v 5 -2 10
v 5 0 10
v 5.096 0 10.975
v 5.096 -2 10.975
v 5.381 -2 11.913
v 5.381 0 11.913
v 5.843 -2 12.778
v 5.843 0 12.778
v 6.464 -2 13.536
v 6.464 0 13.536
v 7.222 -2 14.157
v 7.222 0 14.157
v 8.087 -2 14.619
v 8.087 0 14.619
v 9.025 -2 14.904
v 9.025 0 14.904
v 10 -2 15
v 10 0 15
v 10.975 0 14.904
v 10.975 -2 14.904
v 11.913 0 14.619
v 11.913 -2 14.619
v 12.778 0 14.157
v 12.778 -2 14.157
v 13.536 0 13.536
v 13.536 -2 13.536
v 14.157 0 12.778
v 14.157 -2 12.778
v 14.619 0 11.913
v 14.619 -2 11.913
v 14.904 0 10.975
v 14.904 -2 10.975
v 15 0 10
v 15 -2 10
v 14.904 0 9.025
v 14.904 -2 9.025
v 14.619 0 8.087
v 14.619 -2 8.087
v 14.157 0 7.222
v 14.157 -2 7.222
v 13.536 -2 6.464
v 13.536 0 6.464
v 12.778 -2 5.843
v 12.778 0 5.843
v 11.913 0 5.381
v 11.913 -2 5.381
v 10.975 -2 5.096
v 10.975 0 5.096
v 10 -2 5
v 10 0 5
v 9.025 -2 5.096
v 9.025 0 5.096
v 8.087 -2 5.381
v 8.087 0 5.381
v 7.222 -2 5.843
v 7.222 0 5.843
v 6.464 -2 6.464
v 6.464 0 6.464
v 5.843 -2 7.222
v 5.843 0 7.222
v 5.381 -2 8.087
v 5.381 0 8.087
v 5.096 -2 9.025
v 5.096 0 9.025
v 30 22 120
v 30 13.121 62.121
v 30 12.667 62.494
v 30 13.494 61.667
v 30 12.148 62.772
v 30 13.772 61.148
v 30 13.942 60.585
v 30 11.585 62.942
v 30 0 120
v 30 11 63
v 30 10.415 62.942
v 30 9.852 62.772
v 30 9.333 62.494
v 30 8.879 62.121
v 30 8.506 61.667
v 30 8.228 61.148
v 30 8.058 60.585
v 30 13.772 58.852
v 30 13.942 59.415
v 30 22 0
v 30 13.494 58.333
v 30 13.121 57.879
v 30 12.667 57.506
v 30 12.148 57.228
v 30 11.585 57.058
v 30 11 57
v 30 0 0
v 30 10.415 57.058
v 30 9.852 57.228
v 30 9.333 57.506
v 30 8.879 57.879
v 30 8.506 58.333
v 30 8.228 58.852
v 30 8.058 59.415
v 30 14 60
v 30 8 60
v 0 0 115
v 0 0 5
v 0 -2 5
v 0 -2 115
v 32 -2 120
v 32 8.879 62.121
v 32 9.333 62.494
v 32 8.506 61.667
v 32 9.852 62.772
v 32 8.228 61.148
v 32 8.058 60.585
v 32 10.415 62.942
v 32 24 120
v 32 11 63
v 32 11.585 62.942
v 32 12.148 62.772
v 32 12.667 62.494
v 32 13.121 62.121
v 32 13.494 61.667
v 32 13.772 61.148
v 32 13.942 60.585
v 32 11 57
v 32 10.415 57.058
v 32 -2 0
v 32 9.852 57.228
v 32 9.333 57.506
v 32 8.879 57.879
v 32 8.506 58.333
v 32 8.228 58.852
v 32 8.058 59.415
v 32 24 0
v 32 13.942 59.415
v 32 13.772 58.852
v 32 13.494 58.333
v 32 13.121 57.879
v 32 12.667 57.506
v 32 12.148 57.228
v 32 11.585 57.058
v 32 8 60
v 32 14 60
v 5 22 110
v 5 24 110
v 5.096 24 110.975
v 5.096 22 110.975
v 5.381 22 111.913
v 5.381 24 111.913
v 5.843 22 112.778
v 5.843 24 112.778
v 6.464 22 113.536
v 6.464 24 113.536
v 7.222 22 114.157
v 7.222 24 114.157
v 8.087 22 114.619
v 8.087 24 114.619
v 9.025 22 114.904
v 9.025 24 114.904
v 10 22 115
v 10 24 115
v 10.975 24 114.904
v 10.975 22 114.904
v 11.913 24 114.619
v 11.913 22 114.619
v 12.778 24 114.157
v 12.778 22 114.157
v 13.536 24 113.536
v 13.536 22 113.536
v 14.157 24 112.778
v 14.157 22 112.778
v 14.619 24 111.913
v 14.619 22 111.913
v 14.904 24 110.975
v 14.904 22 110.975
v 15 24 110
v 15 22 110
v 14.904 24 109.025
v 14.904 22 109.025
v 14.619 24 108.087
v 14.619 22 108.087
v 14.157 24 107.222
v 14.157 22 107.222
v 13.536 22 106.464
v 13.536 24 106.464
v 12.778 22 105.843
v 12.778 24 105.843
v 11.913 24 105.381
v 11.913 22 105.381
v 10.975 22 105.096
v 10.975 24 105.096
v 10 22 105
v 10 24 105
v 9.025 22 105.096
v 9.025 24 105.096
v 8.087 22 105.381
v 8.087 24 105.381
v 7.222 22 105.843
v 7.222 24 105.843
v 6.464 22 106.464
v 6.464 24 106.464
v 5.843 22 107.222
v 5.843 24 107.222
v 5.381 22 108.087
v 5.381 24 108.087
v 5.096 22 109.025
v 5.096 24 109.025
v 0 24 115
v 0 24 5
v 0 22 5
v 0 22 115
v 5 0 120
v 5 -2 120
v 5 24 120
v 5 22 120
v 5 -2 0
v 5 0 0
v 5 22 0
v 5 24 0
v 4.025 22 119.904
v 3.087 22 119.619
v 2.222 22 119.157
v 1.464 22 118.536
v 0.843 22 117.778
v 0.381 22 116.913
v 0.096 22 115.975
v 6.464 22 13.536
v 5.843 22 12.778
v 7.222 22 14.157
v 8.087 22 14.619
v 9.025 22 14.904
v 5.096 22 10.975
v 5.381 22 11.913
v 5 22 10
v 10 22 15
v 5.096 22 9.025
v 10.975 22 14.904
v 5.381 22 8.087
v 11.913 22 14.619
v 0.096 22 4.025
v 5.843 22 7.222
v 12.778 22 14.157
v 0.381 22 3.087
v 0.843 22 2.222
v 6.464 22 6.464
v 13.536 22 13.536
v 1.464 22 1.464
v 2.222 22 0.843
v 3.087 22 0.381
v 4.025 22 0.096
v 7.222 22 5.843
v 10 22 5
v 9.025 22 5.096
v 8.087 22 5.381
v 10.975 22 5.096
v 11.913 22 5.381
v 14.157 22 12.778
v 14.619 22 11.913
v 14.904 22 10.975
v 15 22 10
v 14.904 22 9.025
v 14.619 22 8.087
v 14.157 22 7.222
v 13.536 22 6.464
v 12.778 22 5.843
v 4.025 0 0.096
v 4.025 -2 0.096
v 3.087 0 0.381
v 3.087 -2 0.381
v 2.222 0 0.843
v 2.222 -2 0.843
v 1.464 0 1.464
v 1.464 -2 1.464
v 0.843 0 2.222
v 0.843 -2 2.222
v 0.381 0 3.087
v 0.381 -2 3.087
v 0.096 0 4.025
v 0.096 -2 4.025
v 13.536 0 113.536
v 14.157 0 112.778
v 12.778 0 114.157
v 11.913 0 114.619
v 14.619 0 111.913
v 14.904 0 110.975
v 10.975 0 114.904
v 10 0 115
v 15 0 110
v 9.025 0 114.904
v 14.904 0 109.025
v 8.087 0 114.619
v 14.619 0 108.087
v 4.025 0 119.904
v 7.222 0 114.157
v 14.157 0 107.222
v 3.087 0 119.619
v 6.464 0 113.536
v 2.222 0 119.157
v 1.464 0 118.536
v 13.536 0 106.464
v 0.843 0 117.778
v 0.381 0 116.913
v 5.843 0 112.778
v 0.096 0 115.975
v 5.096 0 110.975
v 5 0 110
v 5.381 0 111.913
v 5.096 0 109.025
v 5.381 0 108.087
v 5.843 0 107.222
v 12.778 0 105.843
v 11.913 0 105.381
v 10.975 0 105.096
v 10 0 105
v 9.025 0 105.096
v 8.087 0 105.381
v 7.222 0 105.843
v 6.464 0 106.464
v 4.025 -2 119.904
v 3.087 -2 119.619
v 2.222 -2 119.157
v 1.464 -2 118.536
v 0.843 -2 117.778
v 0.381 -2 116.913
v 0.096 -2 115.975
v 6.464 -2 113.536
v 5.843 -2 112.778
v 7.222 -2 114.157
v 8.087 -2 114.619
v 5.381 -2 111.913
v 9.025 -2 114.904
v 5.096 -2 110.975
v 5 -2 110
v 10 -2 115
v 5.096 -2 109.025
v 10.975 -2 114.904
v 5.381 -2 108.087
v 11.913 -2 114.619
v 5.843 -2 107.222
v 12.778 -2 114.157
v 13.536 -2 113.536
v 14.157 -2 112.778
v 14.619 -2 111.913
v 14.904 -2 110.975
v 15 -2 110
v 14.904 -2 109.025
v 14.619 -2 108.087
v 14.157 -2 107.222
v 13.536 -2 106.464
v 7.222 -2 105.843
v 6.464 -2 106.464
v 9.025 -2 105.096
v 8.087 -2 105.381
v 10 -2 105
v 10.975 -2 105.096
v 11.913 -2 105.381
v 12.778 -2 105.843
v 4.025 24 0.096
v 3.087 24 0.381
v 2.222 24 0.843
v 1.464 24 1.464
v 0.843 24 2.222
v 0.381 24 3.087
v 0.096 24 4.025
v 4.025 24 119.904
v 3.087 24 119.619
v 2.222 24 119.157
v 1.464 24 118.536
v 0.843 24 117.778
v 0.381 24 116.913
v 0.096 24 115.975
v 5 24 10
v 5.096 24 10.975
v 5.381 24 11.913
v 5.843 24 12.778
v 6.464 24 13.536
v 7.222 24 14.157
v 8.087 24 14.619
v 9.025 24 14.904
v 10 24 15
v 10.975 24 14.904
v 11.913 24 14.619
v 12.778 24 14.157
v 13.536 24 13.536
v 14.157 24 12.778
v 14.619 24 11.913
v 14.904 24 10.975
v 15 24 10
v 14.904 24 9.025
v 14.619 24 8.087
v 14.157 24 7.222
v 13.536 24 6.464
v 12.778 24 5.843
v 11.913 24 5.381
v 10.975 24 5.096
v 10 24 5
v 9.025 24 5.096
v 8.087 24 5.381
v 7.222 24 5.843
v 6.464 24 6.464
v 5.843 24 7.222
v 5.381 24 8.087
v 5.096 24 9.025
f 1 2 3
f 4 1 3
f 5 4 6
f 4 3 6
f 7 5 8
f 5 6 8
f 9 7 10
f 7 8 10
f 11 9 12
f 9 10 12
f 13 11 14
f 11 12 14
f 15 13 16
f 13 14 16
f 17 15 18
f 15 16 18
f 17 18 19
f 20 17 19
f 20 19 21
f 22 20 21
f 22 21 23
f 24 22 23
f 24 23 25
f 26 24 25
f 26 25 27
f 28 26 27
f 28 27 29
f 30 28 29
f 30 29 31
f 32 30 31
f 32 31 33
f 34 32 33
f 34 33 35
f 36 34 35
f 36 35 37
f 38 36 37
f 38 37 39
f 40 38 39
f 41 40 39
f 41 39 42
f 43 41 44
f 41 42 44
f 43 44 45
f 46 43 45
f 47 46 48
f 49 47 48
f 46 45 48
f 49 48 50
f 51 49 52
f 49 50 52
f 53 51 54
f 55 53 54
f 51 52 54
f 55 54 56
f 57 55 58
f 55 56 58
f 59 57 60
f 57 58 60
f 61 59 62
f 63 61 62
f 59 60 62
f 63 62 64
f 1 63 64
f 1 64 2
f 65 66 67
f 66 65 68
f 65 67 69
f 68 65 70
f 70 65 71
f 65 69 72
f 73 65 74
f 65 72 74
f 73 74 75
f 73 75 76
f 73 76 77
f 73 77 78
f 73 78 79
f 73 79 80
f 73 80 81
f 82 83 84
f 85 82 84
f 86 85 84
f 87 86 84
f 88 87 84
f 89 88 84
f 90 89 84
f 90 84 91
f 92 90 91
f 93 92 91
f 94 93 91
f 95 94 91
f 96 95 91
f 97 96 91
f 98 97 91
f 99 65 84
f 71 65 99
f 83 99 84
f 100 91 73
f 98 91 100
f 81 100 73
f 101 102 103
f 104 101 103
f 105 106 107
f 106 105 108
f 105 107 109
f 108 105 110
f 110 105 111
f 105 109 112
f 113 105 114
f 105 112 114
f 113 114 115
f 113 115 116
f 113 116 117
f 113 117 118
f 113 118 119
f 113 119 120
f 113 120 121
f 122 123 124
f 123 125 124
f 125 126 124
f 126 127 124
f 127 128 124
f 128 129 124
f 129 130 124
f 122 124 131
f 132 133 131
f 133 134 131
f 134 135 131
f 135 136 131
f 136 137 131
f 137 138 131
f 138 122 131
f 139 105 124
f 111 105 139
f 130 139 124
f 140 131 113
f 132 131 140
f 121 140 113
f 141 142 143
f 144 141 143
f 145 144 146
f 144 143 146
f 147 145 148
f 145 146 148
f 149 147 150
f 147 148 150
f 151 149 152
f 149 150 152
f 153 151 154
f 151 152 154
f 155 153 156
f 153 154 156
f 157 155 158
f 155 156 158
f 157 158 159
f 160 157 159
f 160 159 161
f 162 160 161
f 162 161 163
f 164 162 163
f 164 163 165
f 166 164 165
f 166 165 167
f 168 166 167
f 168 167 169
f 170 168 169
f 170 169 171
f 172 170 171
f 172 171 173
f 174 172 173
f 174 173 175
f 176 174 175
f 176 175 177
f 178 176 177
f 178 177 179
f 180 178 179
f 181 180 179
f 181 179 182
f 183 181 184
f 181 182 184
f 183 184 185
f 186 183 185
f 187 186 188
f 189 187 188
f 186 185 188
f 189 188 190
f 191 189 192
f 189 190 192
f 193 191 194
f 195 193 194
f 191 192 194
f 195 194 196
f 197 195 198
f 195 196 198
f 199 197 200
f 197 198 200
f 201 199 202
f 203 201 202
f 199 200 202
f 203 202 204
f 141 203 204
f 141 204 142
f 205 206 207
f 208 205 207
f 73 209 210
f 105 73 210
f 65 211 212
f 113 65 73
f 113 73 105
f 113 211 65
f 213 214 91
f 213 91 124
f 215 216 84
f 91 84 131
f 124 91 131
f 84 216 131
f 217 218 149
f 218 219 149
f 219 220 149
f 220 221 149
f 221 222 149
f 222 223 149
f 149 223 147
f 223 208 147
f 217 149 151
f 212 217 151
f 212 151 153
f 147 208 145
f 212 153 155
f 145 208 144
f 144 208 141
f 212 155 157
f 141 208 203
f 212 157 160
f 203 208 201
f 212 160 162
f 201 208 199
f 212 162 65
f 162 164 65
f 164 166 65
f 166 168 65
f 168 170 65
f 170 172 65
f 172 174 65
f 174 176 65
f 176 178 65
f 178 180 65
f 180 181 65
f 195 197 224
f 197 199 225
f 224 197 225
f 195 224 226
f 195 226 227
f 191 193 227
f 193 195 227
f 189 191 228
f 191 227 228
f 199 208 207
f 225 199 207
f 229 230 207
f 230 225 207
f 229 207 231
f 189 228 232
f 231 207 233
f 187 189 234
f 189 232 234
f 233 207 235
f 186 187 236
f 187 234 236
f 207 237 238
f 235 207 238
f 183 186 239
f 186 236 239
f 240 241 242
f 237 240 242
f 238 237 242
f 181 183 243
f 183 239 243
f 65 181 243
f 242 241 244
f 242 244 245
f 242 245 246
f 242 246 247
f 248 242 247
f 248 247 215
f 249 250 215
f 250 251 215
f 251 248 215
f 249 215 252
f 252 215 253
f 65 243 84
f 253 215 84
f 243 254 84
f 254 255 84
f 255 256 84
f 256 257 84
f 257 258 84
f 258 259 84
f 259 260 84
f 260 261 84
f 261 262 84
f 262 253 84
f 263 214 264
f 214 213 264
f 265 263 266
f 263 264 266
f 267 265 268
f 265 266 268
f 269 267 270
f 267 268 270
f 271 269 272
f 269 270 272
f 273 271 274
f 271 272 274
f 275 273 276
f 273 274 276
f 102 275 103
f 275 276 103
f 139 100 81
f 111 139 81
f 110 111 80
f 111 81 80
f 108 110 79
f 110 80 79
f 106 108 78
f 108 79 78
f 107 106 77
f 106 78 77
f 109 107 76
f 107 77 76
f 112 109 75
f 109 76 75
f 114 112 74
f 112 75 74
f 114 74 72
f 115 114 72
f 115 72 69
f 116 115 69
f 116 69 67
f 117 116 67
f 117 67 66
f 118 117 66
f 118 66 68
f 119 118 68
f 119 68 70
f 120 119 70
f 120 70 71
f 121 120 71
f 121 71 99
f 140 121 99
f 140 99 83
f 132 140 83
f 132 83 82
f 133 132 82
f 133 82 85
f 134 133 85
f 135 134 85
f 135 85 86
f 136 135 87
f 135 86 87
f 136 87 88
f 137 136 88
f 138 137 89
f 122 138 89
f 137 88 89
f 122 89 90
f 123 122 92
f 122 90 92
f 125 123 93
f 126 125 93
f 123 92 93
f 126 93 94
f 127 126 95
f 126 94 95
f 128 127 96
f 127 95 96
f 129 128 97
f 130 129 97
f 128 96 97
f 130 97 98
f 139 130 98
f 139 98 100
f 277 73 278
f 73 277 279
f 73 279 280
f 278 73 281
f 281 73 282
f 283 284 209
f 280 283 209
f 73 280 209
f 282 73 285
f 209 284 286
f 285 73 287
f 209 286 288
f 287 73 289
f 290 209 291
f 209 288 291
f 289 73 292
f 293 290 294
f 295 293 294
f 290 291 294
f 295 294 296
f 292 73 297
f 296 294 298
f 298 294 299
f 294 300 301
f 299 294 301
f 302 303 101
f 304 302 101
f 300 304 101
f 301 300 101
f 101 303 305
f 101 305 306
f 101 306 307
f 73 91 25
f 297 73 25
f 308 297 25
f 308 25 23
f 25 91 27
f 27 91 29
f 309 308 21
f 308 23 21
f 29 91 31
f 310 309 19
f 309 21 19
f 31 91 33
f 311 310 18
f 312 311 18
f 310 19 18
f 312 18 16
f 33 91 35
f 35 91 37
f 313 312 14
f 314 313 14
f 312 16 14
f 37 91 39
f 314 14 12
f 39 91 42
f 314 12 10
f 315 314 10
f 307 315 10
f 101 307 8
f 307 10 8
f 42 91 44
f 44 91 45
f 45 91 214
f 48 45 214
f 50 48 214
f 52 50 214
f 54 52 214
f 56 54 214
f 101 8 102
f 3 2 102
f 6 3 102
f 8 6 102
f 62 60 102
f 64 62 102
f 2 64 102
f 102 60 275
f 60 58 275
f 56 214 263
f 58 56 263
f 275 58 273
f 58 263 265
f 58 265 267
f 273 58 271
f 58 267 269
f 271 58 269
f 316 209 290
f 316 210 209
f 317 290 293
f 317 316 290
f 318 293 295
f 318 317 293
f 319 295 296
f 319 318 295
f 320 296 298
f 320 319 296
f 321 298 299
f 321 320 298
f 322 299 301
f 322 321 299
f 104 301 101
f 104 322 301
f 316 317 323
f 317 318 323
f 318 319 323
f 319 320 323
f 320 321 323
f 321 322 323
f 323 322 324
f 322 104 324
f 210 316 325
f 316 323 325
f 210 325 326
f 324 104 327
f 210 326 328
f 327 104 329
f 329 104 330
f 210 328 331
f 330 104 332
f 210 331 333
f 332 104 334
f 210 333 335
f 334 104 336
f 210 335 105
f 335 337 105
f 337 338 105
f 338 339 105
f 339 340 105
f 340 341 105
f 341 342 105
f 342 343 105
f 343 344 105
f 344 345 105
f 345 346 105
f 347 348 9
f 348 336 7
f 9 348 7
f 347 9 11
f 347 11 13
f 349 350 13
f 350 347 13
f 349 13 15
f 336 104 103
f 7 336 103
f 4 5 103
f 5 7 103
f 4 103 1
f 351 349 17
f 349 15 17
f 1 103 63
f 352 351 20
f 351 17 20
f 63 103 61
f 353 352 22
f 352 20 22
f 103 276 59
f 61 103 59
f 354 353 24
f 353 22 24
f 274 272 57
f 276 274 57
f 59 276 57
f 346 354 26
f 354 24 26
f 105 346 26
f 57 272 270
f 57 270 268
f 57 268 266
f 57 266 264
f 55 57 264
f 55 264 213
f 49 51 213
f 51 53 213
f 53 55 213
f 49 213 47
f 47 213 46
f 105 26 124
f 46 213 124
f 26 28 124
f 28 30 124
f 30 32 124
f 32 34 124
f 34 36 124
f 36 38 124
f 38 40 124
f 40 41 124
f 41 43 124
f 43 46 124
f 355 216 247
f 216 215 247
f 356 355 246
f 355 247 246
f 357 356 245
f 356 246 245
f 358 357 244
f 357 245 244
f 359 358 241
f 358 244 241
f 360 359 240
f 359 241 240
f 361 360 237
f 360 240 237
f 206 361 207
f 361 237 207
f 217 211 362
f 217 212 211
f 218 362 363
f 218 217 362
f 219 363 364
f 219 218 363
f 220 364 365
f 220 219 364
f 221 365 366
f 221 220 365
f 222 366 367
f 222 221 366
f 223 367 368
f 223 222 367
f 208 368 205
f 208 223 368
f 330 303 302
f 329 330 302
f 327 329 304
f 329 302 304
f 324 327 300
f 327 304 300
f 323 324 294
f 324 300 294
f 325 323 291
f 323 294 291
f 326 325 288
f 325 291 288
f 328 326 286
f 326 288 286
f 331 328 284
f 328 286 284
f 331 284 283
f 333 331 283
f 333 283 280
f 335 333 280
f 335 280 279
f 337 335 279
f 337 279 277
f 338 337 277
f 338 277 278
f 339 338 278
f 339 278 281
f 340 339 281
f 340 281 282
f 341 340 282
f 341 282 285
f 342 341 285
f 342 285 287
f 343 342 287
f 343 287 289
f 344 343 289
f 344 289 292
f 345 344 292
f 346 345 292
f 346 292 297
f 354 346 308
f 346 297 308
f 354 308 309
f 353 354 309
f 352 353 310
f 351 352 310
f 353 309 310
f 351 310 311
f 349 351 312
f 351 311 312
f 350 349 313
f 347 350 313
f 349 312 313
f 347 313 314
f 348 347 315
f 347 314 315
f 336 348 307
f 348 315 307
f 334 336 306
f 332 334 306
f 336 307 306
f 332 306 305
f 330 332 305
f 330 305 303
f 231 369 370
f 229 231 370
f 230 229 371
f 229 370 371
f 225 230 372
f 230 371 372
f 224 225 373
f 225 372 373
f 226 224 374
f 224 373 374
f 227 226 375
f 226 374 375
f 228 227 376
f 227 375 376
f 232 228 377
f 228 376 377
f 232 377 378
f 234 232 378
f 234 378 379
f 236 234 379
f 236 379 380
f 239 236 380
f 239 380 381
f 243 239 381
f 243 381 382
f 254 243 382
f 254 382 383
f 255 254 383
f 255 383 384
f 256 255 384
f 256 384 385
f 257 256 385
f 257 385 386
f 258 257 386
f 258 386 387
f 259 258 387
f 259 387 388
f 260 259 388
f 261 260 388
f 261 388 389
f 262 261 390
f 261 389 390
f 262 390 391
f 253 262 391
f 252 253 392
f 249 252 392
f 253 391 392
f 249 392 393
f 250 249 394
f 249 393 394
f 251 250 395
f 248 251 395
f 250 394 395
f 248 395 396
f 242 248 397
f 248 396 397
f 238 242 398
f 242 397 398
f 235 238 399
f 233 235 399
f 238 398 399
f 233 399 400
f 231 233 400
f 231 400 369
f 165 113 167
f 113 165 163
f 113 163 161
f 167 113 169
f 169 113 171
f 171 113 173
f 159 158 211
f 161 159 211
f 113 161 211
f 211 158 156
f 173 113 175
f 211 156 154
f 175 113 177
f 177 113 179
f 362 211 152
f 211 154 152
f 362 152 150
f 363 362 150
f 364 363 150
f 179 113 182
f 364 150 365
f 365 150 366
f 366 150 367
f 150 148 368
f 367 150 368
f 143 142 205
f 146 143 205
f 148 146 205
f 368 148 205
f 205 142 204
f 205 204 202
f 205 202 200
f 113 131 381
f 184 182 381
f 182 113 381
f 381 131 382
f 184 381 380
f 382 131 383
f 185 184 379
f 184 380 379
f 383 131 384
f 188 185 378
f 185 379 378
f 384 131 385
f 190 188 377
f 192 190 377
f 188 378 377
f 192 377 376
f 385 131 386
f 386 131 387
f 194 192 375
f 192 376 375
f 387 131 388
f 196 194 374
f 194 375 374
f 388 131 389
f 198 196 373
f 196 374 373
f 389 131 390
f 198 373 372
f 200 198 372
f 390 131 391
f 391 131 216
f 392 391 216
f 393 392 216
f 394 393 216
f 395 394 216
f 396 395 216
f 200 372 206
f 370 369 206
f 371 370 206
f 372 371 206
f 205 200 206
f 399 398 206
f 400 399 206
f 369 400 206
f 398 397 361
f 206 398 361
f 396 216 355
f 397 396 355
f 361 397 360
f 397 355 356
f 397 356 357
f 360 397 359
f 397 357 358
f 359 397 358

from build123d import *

# Parameters (mm, degrees)
F1_DEPTH = 120
F3_D     = 10
F5_D     = 6
F6_R     = 5


with BuildPart() as f1:
    # F0 (on Top) → F1 (new body)
    with BuildSketch(Plane.XY):
        Polygon((30, 0), (0, 0), (0, -2), (32, -2), (32, 24), (0, 24), (0, 22), (30, 22), align=None)
    extrude(amount=F1_DEPTH)

    # F3 (through all)
    with Locations(Plane.XZ.offset(2)):
        with Locations((10, 110), (10, 10)):
            Hole(F3_D / 2)

    # F5 (through all)
    with Locations(Plane.YZ.offset(32)):
        with Locations((11, 60)):
            Hole(F5_D / 2)

    # F6
    f6_edges = [f1.edges().sort_by_distance(p)[0] for p in [
        (0, -1, 120),
        (0, 23, 120),
        (0, 23, 0),
        (0, -1, 0),
    ]]
    fillet(f6_edges, radius=F6_R)


solid = f1.part
